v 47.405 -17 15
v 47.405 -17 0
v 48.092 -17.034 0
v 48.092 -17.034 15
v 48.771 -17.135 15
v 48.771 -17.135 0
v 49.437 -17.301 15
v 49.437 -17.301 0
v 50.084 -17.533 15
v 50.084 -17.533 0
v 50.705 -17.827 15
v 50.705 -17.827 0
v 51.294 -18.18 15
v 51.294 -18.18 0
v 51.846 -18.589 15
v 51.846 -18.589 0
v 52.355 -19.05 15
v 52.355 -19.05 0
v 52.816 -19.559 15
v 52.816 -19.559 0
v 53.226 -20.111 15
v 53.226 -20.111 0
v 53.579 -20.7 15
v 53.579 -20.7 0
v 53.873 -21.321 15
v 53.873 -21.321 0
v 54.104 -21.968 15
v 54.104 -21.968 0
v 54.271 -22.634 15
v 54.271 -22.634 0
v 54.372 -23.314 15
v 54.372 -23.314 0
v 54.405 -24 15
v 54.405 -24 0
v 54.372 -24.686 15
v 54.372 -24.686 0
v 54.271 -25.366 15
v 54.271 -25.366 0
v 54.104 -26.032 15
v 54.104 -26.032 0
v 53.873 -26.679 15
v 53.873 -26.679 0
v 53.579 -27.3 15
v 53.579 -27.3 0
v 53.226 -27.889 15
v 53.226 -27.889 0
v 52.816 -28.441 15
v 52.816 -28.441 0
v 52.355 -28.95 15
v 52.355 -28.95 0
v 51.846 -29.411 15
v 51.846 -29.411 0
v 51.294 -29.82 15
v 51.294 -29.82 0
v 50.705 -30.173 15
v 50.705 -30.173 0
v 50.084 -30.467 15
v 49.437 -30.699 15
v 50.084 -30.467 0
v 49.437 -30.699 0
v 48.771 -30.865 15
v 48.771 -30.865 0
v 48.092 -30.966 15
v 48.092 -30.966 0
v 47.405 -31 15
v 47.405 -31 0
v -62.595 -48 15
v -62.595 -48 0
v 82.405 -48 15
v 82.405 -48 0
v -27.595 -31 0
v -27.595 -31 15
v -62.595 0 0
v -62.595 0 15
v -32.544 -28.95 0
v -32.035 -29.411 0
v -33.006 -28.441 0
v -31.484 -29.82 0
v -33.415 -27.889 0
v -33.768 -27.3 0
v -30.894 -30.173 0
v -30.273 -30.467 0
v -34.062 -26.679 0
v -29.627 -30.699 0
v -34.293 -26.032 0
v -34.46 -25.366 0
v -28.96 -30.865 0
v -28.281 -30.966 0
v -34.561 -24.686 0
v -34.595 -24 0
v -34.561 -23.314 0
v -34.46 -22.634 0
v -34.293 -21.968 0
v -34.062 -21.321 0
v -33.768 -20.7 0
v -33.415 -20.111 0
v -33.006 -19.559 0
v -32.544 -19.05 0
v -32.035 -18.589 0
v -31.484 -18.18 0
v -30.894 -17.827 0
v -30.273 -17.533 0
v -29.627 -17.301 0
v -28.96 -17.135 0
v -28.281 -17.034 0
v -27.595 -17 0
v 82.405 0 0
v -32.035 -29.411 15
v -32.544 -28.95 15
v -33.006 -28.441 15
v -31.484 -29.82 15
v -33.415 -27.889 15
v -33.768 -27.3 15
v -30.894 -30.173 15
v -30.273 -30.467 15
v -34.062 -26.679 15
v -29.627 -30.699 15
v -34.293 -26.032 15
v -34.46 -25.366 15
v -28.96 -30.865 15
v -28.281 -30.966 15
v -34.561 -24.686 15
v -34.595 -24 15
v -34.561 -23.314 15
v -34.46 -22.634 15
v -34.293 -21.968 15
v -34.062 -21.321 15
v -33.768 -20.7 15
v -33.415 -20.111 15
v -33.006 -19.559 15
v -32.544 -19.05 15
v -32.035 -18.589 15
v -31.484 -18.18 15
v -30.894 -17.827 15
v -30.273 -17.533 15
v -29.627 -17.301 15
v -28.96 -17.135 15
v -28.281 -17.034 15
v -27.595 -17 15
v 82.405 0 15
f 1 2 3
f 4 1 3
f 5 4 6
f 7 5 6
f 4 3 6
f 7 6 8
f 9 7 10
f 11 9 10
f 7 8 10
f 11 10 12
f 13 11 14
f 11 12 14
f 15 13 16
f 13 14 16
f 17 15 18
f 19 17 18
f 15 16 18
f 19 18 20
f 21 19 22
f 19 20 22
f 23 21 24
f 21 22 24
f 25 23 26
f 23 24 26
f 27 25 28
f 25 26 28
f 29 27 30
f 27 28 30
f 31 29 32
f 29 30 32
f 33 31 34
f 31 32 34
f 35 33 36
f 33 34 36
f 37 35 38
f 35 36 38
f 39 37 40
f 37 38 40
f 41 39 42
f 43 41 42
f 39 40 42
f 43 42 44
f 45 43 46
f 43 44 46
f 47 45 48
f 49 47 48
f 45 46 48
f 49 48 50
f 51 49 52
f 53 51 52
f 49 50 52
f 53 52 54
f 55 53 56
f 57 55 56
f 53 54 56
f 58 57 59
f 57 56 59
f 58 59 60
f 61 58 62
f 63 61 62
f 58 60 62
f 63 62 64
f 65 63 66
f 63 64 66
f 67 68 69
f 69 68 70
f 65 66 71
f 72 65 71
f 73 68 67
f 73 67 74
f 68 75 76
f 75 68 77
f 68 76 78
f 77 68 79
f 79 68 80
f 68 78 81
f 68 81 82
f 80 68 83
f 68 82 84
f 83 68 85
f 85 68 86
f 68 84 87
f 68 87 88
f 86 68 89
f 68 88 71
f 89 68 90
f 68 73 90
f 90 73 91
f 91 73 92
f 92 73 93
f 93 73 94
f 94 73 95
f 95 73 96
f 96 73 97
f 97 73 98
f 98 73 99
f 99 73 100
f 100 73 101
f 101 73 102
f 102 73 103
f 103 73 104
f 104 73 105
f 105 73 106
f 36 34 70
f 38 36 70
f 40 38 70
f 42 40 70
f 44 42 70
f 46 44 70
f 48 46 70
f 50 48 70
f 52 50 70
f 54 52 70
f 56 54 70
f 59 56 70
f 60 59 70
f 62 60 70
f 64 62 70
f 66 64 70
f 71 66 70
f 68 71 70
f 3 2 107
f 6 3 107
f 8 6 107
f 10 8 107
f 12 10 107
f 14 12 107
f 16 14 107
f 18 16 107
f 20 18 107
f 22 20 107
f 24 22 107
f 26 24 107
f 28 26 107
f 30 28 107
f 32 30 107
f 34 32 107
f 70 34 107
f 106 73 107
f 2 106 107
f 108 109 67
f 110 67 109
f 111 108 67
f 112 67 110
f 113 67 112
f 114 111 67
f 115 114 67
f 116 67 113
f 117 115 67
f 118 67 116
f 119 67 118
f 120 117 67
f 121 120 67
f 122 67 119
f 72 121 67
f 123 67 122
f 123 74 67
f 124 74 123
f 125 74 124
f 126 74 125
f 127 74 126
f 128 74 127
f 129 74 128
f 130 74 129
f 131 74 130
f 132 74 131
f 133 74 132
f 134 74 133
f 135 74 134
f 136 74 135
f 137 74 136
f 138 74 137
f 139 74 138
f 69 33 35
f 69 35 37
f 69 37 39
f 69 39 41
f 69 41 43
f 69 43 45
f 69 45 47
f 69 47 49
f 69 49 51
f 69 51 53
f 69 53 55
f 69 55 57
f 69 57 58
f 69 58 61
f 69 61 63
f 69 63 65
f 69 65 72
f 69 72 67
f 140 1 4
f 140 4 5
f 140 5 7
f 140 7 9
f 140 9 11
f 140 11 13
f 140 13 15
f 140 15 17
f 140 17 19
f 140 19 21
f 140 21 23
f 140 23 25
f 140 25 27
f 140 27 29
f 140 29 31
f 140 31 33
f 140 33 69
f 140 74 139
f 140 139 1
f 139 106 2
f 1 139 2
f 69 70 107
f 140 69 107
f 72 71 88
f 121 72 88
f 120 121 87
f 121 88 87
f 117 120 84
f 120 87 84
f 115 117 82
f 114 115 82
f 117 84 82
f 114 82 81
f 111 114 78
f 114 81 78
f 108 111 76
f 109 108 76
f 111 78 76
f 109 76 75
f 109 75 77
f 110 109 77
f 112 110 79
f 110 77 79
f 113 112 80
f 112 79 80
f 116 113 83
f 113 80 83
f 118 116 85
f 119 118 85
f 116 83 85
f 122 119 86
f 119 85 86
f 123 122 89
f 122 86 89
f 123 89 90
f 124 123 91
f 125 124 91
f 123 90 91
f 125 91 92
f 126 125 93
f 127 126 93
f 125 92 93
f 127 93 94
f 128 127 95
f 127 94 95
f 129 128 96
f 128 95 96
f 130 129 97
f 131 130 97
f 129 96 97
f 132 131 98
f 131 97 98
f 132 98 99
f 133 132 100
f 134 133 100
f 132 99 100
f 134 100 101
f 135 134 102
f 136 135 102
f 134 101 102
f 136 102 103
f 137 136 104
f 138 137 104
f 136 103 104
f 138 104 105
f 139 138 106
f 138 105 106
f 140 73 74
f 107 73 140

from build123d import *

# Parameters (mm, degrees)
F0_W     = 145
F0_H     = 48
F1_DEPTH = 15
F2_W     = 145
F2_H     = 12
F3_DEPTH = 15


with BuildPart() as f1:
    # F0 (on Top) → F1 (new body)
    with BuildSketch(Plane.XY):
        with Locations((9.905382, -24)):
            Rectangle(F0_W, F0_H)
        with BuildLine():
            ThreePointArc((-27.594618, -31), (-34.594618, -24), (-27.594618, -17))
            Line((-27.594618, -17), (47.405382, -17))
            ThreePointArc((47.405382, -17), (54.405382, -24), (47.405382, -31))
            Line((47.405382, -31), (-27.594618, -31))
        make_face(mode=Mode.SUBTRACT)
    extrude(amount=F1_DEPTH)

    # F2 (on Top) → F3 (join)
    with BuildSketch(Plane.XY):
        with Locations((9.905382, -6)):
            Rectangle(F2_W, F2_H)
    extrude(amount=F3_DEPTH)


solid = f1.part
